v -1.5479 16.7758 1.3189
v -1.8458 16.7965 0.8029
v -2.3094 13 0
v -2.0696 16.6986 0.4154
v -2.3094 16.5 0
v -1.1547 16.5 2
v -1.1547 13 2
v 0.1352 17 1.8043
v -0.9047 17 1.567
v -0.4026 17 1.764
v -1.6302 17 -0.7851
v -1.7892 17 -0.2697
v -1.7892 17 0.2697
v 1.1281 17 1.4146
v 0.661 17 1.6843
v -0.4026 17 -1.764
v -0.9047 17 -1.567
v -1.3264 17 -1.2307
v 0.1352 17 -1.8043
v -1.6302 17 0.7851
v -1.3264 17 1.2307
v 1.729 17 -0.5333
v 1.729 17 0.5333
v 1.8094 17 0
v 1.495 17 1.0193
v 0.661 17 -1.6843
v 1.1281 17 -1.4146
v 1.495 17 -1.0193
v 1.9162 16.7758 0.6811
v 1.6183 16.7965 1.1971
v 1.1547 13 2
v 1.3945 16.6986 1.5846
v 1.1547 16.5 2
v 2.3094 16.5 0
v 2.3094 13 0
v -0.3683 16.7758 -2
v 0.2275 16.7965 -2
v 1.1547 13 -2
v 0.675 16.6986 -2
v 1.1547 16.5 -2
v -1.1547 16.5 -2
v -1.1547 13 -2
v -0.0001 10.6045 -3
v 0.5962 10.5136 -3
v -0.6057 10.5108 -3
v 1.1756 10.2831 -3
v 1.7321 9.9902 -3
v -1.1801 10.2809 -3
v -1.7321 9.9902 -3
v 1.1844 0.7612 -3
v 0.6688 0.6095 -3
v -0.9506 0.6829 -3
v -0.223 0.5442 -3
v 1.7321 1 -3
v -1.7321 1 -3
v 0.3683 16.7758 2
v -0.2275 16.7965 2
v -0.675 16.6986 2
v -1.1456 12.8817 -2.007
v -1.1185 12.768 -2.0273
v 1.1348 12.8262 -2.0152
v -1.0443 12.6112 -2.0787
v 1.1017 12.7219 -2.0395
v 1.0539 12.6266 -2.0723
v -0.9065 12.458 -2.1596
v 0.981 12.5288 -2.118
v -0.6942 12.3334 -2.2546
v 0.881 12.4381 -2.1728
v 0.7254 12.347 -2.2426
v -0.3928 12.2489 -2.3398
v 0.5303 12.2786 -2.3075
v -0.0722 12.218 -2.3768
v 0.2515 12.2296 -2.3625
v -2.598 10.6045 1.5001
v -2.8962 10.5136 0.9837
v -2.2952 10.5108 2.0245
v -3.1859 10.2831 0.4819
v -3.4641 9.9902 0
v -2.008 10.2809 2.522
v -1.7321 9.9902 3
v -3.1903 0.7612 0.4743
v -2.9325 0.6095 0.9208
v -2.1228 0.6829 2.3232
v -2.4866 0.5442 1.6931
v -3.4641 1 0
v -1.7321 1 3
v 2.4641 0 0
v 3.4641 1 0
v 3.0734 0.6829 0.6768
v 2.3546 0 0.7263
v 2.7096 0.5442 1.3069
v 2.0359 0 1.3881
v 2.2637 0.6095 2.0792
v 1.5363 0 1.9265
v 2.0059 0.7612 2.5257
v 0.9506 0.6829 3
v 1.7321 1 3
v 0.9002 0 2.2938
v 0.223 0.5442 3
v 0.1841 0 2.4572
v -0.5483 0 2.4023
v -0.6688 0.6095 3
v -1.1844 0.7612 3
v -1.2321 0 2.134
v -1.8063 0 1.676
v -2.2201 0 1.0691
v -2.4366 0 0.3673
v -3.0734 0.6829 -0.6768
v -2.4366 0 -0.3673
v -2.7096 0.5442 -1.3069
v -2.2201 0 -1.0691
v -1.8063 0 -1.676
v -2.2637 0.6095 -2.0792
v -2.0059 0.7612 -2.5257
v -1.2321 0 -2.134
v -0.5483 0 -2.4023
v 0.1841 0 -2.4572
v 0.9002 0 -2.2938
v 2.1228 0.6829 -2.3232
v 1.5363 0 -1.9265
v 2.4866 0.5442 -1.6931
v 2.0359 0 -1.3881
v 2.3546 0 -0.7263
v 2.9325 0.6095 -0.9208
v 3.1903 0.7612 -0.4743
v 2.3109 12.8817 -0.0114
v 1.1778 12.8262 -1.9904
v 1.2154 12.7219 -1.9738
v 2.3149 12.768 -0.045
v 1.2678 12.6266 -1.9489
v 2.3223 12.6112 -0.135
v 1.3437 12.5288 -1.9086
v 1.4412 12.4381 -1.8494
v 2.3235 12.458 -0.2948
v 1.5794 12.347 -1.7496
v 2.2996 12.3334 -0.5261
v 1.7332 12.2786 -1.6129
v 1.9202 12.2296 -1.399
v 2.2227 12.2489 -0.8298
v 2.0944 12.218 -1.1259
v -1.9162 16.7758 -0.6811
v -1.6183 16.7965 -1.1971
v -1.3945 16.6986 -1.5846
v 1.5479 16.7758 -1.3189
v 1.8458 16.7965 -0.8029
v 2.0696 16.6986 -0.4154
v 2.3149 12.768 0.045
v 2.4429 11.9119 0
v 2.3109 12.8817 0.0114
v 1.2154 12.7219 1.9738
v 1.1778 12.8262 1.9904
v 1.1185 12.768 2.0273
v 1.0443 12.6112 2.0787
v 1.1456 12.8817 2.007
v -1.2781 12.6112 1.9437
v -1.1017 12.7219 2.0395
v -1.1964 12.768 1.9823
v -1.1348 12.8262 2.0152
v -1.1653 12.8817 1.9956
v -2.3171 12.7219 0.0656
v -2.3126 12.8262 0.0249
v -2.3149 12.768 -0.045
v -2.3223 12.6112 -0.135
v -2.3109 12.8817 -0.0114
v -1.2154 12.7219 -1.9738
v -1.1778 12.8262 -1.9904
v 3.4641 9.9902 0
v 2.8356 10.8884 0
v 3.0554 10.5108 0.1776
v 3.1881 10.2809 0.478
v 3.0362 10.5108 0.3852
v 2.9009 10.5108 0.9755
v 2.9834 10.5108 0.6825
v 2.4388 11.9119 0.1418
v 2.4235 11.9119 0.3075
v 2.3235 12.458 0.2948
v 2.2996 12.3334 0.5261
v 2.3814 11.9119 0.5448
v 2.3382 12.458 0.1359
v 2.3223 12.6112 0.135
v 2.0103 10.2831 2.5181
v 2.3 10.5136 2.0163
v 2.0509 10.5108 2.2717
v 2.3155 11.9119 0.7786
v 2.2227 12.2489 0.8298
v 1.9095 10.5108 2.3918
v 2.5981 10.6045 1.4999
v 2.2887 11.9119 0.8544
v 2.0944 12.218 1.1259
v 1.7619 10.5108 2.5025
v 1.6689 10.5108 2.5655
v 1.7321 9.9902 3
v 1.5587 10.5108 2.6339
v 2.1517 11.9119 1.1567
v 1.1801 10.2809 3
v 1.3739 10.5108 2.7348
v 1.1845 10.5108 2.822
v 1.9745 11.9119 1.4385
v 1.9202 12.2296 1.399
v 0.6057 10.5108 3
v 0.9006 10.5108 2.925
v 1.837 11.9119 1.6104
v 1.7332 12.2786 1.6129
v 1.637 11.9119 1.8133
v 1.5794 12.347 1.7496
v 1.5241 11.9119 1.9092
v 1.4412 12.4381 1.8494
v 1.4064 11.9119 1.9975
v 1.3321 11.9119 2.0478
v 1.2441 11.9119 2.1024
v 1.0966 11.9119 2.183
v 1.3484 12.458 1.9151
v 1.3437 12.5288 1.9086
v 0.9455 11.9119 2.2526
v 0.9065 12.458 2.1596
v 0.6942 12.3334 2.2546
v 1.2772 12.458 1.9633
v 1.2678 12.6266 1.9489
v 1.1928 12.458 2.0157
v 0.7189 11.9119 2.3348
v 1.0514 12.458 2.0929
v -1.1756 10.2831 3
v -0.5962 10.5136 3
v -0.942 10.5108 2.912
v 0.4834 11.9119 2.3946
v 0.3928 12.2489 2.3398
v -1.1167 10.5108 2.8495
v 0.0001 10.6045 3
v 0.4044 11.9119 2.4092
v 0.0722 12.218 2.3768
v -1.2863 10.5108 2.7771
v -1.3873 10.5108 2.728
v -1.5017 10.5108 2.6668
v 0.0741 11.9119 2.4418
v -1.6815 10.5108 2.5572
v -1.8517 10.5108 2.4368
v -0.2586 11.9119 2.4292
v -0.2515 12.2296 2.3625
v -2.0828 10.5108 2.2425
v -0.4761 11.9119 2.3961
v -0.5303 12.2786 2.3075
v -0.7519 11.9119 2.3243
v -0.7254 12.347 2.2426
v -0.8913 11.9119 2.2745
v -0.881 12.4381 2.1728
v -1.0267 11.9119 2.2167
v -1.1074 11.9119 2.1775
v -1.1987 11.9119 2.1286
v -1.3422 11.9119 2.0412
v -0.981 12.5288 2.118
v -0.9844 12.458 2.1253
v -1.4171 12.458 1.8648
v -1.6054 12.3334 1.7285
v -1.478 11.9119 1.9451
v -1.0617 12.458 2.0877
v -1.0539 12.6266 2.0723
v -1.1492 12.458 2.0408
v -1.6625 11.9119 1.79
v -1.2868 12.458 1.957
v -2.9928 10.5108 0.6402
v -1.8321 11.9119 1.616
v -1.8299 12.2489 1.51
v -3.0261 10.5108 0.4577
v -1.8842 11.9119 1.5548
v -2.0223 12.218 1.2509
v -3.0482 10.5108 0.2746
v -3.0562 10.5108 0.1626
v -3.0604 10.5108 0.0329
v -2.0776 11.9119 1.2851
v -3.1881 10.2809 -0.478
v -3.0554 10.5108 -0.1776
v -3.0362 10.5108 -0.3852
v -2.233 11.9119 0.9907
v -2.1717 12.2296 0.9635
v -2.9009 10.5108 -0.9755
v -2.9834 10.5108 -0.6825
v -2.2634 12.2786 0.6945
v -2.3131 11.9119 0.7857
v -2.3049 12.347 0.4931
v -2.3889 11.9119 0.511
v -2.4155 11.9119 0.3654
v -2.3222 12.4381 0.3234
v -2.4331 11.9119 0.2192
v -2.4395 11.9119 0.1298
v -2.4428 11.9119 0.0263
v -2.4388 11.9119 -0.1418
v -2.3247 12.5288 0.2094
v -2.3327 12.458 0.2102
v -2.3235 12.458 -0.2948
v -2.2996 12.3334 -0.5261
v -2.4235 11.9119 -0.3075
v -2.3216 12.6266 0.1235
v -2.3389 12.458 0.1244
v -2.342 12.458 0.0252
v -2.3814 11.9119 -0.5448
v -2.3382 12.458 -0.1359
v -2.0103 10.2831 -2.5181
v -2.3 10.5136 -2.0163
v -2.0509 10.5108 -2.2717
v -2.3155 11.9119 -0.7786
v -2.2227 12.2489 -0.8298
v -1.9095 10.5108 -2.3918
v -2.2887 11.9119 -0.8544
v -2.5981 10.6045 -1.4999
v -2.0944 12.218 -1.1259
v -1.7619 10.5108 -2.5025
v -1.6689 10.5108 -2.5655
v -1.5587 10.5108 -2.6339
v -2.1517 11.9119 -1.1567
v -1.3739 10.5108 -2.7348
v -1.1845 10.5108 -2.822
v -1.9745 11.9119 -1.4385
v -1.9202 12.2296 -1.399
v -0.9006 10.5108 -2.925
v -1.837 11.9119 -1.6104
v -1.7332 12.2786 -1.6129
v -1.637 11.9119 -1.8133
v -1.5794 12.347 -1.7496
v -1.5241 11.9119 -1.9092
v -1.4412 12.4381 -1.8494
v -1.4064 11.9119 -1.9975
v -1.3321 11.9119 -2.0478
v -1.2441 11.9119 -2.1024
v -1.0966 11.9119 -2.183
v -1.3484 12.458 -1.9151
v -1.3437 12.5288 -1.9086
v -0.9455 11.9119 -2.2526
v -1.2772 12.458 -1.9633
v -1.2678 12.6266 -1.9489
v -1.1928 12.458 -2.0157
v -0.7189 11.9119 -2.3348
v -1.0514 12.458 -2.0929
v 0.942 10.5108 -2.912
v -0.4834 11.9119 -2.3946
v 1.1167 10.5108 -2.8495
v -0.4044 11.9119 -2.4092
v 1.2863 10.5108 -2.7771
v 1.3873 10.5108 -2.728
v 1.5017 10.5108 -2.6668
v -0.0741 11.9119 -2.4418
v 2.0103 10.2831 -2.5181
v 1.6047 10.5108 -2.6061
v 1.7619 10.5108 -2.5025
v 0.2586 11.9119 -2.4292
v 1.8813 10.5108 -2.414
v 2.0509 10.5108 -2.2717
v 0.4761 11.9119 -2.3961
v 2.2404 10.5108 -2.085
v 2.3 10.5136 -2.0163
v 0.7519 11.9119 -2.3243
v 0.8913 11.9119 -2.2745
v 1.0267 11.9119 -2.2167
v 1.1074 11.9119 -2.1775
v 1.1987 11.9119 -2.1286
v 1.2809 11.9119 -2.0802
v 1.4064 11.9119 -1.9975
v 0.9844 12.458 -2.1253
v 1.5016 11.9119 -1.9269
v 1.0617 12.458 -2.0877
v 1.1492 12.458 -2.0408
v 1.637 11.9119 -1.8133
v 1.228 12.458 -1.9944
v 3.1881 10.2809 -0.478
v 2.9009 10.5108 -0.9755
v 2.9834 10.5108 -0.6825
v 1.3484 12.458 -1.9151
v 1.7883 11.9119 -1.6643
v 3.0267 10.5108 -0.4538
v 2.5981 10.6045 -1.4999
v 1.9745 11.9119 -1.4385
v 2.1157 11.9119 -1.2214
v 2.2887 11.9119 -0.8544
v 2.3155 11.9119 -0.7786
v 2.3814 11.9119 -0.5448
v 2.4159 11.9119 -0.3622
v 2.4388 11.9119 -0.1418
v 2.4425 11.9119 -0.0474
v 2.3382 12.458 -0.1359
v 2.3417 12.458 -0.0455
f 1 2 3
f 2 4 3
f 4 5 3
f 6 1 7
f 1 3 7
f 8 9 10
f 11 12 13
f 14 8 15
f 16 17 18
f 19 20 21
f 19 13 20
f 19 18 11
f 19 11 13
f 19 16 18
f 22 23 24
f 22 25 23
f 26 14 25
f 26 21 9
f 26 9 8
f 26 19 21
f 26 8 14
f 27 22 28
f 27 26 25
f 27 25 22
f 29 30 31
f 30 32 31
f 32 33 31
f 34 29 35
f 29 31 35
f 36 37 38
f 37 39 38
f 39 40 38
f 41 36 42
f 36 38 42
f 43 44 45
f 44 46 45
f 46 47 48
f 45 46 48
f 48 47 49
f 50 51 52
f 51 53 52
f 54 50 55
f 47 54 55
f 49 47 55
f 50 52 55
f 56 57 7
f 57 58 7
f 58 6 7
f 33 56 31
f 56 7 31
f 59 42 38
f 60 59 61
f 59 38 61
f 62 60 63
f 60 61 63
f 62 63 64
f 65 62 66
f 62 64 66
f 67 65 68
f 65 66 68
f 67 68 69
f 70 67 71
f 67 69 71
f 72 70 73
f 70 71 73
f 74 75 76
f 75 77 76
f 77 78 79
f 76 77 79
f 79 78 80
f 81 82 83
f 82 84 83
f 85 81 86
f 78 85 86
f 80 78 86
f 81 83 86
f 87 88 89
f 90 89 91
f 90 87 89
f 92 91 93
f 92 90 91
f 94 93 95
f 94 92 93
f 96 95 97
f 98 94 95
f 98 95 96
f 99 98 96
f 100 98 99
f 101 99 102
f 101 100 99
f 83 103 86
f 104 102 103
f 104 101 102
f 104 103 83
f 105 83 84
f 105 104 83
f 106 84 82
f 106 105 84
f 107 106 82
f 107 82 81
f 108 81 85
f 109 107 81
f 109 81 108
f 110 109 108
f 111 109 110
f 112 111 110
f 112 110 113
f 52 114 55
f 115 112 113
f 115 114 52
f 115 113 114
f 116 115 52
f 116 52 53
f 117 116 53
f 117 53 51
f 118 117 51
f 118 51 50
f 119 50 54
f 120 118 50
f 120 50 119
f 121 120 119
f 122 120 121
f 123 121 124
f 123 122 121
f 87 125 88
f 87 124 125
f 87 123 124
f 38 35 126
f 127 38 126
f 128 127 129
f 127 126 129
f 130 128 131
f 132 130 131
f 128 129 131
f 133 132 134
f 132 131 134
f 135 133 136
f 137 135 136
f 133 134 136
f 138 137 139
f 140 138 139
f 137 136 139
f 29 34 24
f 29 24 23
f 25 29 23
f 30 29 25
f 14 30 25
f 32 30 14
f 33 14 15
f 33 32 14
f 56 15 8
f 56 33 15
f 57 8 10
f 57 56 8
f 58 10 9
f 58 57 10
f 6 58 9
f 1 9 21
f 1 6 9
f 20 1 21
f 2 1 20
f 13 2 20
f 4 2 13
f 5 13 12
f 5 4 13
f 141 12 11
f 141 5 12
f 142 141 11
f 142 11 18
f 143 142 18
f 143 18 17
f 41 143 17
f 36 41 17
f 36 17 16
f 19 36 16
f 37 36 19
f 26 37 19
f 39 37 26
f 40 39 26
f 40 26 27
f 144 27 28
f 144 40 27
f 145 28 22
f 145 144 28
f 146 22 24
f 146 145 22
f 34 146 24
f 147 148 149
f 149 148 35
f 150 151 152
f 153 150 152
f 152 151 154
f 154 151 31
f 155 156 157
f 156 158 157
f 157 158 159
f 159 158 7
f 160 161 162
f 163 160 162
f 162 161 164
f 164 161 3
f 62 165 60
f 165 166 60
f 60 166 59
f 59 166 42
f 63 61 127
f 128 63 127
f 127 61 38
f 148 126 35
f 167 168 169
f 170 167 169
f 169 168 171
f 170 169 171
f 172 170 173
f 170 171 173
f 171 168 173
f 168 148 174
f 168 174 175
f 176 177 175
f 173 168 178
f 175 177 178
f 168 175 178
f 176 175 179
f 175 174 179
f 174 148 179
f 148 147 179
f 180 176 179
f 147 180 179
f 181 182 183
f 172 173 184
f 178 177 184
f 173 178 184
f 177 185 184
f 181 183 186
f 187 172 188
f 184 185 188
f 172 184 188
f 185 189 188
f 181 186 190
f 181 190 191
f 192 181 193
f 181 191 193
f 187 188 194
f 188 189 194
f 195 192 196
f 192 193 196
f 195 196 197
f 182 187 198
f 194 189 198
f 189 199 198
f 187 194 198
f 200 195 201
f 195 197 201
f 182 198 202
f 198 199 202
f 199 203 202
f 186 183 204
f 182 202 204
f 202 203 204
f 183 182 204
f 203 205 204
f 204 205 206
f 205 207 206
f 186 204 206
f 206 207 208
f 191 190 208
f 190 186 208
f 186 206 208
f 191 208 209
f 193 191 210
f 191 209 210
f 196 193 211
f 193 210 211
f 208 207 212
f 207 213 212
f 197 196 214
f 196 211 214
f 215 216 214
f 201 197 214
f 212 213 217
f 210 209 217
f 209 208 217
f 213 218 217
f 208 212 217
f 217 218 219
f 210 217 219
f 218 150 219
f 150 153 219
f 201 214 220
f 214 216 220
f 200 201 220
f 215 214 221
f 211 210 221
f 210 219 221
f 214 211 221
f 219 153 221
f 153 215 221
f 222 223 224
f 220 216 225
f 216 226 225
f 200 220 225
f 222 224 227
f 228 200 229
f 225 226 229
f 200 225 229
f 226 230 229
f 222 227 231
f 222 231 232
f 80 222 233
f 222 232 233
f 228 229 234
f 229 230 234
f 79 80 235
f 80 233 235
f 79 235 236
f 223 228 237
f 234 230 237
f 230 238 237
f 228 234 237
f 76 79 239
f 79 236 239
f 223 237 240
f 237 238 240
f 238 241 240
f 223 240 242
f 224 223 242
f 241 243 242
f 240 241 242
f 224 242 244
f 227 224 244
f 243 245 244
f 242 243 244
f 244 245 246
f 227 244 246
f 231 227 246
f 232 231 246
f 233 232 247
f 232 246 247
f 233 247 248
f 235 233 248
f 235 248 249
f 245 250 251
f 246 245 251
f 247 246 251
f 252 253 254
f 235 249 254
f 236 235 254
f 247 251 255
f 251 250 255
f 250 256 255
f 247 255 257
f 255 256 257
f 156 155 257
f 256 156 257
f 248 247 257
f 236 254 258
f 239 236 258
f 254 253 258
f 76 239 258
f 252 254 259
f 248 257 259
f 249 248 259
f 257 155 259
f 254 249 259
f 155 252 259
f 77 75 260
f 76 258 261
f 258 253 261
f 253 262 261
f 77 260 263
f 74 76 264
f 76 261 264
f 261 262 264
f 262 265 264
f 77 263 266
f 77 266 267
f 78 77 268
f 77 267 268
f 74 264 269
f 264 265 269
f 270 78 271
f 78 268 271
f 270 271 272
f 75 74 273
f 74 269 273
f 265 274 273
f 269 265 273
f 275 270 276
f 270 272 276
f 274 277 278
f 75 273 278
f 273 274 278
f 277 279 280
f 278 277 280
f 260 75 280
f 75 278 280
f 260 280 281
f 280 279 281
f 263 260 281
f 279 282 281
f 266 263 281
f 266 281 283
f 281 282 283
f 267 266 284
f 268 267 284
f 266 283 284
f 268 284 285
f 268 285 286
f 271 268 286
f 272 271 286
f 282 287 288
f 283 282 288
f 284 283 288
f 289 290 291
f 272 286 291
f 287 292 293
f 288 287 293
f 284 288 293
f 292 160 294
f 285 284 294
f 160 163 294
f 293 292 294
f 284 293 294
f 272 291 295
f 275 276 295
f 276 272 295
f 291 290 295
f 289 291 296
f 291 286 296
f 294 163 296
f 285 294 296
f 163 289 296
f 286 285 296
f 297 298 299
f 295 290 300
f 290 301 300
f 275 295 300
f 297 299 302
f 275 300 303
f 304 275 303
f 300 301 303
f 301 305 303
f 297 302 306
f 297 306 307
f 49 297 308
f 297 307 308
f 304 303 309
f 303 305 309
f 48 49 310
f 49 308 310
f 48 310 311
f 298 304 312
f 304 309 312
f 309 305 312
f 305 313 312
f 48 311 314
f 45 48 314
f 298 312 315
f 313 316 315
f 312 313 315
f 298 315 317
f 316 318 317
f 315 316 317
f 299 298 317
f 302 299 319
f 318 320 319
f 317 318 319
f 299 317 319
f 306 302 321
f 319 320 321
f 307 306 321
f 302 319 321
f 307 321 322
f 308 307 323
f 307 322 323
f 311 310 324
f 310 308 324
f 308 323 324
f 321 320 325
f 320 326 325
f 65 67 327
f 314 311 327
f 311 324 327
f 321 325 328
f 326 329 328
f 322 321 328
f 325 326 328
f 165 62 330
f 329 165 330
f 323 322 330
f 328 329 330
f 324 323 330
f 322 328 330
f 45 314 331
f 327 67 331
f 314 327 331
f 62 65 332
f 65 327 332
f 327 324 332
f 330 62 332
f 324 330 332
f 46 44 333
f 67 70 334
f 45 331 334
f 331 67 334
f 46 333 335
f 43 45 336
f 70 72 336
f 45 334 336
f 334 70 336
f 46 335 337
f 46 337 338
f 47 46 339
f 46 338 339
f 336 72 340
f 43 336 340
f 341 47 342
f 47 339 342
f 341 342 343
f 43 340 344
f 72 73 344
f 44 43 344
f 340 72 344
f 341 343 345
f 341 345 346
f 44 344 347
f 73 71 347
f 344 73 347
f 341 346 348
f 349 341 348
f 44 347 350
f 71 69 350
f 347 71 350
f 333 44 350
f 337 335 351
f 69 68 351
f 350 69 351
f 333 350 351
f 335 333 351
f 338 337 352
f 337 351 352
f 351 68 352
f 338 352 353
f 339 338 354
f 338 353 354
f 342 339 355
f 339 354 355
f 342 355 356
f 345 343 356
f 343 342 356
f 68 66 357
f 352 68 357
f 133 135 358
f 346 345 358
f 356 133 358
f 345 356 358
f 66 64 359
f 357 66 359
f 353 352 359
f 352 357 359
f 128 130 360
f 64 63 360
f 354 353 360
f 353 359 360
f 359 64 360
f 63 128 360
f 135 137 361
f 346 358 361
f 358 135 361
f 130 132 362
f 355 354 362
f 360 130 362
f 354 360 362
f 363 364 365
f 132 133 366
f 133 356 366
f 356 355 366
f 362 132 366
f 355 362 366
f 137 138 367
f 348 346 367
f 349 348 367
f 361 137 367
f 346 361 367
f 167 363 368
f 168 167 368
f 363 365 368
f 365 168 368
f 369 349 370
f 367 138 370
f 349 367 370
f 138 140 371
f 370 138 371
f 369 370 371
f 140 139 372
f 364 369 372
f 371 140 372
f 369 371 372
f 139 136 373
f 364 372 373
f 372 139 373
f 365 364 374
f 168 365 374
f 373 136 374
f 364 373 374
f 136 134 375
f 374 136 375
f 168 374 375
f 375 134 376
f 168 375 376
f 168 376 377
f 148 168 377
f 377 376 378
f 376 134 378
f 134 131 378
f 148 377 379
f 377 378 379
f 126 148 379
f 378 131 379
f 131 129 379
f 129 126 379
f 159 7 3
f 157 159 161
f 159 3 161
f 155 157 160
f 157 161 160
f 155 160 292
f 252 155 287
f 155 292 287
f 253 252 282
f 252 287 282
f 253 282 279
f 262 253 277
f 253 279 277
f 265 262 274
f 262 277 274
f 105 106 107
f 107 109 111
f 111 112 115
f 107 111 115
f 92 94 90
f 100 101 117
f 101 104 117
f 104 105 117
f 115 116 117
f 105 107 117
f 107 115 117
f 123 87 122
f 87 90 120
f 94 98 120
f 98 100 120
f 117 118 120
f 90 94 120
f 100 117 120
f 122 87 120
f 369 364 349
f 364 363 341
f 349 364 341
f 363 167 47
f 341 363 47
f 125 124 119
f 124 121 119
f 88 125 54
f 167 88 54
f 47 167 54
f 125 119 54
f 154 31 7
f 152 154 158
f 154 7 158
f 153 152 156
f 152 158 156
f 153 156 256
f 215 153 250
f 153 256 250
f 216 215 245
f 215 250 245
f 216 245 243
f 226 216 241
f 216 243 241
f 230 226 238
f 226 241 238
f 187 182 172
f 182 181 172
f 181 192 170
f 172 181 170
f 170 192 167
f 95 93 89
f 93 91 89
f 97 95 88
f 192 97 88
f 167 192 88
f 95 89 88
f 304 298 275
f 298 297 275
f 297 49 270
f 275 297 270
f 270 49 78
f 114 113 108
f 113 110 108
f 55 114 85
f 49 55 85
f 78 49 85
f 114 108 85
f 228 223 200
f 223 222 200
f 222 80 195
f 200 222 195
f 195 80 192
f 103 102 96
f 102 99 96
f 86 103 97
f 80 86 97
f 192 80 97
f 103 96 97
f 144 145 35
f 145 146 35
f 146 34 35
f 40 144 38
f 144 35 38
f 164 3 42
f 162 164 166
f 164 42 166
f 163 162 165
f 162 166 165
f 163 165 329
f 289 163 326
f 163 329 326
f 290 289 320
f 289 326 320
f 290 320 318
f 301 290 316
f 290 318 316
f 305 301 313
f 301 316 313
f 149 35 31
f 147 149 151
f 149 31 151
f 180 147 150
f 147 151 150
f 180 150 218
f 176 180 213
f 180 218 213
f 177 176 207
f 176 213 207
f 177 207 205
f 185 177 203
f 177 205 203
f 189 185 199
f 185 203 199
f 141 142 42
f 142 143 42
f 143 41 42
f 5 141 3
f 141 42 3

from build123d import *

# Parameters (mm, degrees)
BOSS_EXTRUDE1_DEPTH = 13
BOSS_EXTRUDE2_DEPTH = 4
SKETCH8_R           = 1
CUT_EXTRUDE1_DEPTH  = 4.464101715
CIRPATTERN1_COUNT   = 6


with BuildPart() as part:
    # Sketch2 → Boss-Extrude1 (new body)
    with BuildSketch(Plane(origin=(0, 0, 0), x_dir=(1, 0, 0), z_dir=(0, 1, 0))):
        Polygon((3.464101615, 0), (1.732050808, 3), (-1.732050808, 3), (-3.464101615, 0), (-1.732050808, -3), (1.732050808, -3), align=None)
    extrude(amount=BOSS_EXTRUDE1_DEPTH)

    # Sketch3 → Boss-Extrude2 (add)
    with BuildSketch(Plane(origin=(0, 13, 0), x_dir=(1, 0, 0), z_dir=(0, 1, 0))):
        Polygon((2.309401077, 0), (1.154700538, 2), (-1.154700538, 2), (-2.309401077, 0), (-1.154700538, -2), (1.154700538, -2), align=None)
    extrude(amount=BOSS_EXTRUDE2_DEPTH)

    # Sketch5 → Cut-Revolve2 (revolve, cut)
    with BuildSketch(Plane.XY):
        Polygon((3.464101615, 1), (2.464101615, 0), (3.464101615, 0), align=None)
        Polygon((1.809401077, 17), (2.309401077, 16.5), (2.309401077, 17), align=None)
        with BuildLine():
            Line((2.309401077, 13), (3.464101615, 13))
            Line((3.464101615, 13), (3.464101615, 9.990187462))
            ThreePointArc((3.464101615, 9.990187462), (2.607981818, 11.388145102), (2.309401077, 13))
        make_face()
    revolve(axis=Axis((0, 17, 0), (0, -1, 0)), mode=Mode.SUBTRACT)

    # Sketch8 → Cut-Extrude1 (cut, symmetric)
    with BuildSketch(Plane(origin=(0, 0, 0), x_dir=(0, 0, -1), z_dir=(1, 0, 0))):
        with Locations((3, 13)):
            Circle(SKETCH8_R)
    cut_extrude1 = extrude(amount=CUT_EXTRUDE1_DEPTH, both=True, mode=Mode.SUBTRACT)

    # CirPattern1: Cut-Extrude1 ×6 about axis
    cirpattern1_axis = Axis((0, 17, 0), (0, 1, 0))
    for i in range(1, CIRPATTERN1_COUNT):
        add(cut_extrude1.rotate(cirpattern1_axis, i * 360 / CIRPATTERN1_COUNT), mode=Mode.SUBTRACT)


solid = part.part
